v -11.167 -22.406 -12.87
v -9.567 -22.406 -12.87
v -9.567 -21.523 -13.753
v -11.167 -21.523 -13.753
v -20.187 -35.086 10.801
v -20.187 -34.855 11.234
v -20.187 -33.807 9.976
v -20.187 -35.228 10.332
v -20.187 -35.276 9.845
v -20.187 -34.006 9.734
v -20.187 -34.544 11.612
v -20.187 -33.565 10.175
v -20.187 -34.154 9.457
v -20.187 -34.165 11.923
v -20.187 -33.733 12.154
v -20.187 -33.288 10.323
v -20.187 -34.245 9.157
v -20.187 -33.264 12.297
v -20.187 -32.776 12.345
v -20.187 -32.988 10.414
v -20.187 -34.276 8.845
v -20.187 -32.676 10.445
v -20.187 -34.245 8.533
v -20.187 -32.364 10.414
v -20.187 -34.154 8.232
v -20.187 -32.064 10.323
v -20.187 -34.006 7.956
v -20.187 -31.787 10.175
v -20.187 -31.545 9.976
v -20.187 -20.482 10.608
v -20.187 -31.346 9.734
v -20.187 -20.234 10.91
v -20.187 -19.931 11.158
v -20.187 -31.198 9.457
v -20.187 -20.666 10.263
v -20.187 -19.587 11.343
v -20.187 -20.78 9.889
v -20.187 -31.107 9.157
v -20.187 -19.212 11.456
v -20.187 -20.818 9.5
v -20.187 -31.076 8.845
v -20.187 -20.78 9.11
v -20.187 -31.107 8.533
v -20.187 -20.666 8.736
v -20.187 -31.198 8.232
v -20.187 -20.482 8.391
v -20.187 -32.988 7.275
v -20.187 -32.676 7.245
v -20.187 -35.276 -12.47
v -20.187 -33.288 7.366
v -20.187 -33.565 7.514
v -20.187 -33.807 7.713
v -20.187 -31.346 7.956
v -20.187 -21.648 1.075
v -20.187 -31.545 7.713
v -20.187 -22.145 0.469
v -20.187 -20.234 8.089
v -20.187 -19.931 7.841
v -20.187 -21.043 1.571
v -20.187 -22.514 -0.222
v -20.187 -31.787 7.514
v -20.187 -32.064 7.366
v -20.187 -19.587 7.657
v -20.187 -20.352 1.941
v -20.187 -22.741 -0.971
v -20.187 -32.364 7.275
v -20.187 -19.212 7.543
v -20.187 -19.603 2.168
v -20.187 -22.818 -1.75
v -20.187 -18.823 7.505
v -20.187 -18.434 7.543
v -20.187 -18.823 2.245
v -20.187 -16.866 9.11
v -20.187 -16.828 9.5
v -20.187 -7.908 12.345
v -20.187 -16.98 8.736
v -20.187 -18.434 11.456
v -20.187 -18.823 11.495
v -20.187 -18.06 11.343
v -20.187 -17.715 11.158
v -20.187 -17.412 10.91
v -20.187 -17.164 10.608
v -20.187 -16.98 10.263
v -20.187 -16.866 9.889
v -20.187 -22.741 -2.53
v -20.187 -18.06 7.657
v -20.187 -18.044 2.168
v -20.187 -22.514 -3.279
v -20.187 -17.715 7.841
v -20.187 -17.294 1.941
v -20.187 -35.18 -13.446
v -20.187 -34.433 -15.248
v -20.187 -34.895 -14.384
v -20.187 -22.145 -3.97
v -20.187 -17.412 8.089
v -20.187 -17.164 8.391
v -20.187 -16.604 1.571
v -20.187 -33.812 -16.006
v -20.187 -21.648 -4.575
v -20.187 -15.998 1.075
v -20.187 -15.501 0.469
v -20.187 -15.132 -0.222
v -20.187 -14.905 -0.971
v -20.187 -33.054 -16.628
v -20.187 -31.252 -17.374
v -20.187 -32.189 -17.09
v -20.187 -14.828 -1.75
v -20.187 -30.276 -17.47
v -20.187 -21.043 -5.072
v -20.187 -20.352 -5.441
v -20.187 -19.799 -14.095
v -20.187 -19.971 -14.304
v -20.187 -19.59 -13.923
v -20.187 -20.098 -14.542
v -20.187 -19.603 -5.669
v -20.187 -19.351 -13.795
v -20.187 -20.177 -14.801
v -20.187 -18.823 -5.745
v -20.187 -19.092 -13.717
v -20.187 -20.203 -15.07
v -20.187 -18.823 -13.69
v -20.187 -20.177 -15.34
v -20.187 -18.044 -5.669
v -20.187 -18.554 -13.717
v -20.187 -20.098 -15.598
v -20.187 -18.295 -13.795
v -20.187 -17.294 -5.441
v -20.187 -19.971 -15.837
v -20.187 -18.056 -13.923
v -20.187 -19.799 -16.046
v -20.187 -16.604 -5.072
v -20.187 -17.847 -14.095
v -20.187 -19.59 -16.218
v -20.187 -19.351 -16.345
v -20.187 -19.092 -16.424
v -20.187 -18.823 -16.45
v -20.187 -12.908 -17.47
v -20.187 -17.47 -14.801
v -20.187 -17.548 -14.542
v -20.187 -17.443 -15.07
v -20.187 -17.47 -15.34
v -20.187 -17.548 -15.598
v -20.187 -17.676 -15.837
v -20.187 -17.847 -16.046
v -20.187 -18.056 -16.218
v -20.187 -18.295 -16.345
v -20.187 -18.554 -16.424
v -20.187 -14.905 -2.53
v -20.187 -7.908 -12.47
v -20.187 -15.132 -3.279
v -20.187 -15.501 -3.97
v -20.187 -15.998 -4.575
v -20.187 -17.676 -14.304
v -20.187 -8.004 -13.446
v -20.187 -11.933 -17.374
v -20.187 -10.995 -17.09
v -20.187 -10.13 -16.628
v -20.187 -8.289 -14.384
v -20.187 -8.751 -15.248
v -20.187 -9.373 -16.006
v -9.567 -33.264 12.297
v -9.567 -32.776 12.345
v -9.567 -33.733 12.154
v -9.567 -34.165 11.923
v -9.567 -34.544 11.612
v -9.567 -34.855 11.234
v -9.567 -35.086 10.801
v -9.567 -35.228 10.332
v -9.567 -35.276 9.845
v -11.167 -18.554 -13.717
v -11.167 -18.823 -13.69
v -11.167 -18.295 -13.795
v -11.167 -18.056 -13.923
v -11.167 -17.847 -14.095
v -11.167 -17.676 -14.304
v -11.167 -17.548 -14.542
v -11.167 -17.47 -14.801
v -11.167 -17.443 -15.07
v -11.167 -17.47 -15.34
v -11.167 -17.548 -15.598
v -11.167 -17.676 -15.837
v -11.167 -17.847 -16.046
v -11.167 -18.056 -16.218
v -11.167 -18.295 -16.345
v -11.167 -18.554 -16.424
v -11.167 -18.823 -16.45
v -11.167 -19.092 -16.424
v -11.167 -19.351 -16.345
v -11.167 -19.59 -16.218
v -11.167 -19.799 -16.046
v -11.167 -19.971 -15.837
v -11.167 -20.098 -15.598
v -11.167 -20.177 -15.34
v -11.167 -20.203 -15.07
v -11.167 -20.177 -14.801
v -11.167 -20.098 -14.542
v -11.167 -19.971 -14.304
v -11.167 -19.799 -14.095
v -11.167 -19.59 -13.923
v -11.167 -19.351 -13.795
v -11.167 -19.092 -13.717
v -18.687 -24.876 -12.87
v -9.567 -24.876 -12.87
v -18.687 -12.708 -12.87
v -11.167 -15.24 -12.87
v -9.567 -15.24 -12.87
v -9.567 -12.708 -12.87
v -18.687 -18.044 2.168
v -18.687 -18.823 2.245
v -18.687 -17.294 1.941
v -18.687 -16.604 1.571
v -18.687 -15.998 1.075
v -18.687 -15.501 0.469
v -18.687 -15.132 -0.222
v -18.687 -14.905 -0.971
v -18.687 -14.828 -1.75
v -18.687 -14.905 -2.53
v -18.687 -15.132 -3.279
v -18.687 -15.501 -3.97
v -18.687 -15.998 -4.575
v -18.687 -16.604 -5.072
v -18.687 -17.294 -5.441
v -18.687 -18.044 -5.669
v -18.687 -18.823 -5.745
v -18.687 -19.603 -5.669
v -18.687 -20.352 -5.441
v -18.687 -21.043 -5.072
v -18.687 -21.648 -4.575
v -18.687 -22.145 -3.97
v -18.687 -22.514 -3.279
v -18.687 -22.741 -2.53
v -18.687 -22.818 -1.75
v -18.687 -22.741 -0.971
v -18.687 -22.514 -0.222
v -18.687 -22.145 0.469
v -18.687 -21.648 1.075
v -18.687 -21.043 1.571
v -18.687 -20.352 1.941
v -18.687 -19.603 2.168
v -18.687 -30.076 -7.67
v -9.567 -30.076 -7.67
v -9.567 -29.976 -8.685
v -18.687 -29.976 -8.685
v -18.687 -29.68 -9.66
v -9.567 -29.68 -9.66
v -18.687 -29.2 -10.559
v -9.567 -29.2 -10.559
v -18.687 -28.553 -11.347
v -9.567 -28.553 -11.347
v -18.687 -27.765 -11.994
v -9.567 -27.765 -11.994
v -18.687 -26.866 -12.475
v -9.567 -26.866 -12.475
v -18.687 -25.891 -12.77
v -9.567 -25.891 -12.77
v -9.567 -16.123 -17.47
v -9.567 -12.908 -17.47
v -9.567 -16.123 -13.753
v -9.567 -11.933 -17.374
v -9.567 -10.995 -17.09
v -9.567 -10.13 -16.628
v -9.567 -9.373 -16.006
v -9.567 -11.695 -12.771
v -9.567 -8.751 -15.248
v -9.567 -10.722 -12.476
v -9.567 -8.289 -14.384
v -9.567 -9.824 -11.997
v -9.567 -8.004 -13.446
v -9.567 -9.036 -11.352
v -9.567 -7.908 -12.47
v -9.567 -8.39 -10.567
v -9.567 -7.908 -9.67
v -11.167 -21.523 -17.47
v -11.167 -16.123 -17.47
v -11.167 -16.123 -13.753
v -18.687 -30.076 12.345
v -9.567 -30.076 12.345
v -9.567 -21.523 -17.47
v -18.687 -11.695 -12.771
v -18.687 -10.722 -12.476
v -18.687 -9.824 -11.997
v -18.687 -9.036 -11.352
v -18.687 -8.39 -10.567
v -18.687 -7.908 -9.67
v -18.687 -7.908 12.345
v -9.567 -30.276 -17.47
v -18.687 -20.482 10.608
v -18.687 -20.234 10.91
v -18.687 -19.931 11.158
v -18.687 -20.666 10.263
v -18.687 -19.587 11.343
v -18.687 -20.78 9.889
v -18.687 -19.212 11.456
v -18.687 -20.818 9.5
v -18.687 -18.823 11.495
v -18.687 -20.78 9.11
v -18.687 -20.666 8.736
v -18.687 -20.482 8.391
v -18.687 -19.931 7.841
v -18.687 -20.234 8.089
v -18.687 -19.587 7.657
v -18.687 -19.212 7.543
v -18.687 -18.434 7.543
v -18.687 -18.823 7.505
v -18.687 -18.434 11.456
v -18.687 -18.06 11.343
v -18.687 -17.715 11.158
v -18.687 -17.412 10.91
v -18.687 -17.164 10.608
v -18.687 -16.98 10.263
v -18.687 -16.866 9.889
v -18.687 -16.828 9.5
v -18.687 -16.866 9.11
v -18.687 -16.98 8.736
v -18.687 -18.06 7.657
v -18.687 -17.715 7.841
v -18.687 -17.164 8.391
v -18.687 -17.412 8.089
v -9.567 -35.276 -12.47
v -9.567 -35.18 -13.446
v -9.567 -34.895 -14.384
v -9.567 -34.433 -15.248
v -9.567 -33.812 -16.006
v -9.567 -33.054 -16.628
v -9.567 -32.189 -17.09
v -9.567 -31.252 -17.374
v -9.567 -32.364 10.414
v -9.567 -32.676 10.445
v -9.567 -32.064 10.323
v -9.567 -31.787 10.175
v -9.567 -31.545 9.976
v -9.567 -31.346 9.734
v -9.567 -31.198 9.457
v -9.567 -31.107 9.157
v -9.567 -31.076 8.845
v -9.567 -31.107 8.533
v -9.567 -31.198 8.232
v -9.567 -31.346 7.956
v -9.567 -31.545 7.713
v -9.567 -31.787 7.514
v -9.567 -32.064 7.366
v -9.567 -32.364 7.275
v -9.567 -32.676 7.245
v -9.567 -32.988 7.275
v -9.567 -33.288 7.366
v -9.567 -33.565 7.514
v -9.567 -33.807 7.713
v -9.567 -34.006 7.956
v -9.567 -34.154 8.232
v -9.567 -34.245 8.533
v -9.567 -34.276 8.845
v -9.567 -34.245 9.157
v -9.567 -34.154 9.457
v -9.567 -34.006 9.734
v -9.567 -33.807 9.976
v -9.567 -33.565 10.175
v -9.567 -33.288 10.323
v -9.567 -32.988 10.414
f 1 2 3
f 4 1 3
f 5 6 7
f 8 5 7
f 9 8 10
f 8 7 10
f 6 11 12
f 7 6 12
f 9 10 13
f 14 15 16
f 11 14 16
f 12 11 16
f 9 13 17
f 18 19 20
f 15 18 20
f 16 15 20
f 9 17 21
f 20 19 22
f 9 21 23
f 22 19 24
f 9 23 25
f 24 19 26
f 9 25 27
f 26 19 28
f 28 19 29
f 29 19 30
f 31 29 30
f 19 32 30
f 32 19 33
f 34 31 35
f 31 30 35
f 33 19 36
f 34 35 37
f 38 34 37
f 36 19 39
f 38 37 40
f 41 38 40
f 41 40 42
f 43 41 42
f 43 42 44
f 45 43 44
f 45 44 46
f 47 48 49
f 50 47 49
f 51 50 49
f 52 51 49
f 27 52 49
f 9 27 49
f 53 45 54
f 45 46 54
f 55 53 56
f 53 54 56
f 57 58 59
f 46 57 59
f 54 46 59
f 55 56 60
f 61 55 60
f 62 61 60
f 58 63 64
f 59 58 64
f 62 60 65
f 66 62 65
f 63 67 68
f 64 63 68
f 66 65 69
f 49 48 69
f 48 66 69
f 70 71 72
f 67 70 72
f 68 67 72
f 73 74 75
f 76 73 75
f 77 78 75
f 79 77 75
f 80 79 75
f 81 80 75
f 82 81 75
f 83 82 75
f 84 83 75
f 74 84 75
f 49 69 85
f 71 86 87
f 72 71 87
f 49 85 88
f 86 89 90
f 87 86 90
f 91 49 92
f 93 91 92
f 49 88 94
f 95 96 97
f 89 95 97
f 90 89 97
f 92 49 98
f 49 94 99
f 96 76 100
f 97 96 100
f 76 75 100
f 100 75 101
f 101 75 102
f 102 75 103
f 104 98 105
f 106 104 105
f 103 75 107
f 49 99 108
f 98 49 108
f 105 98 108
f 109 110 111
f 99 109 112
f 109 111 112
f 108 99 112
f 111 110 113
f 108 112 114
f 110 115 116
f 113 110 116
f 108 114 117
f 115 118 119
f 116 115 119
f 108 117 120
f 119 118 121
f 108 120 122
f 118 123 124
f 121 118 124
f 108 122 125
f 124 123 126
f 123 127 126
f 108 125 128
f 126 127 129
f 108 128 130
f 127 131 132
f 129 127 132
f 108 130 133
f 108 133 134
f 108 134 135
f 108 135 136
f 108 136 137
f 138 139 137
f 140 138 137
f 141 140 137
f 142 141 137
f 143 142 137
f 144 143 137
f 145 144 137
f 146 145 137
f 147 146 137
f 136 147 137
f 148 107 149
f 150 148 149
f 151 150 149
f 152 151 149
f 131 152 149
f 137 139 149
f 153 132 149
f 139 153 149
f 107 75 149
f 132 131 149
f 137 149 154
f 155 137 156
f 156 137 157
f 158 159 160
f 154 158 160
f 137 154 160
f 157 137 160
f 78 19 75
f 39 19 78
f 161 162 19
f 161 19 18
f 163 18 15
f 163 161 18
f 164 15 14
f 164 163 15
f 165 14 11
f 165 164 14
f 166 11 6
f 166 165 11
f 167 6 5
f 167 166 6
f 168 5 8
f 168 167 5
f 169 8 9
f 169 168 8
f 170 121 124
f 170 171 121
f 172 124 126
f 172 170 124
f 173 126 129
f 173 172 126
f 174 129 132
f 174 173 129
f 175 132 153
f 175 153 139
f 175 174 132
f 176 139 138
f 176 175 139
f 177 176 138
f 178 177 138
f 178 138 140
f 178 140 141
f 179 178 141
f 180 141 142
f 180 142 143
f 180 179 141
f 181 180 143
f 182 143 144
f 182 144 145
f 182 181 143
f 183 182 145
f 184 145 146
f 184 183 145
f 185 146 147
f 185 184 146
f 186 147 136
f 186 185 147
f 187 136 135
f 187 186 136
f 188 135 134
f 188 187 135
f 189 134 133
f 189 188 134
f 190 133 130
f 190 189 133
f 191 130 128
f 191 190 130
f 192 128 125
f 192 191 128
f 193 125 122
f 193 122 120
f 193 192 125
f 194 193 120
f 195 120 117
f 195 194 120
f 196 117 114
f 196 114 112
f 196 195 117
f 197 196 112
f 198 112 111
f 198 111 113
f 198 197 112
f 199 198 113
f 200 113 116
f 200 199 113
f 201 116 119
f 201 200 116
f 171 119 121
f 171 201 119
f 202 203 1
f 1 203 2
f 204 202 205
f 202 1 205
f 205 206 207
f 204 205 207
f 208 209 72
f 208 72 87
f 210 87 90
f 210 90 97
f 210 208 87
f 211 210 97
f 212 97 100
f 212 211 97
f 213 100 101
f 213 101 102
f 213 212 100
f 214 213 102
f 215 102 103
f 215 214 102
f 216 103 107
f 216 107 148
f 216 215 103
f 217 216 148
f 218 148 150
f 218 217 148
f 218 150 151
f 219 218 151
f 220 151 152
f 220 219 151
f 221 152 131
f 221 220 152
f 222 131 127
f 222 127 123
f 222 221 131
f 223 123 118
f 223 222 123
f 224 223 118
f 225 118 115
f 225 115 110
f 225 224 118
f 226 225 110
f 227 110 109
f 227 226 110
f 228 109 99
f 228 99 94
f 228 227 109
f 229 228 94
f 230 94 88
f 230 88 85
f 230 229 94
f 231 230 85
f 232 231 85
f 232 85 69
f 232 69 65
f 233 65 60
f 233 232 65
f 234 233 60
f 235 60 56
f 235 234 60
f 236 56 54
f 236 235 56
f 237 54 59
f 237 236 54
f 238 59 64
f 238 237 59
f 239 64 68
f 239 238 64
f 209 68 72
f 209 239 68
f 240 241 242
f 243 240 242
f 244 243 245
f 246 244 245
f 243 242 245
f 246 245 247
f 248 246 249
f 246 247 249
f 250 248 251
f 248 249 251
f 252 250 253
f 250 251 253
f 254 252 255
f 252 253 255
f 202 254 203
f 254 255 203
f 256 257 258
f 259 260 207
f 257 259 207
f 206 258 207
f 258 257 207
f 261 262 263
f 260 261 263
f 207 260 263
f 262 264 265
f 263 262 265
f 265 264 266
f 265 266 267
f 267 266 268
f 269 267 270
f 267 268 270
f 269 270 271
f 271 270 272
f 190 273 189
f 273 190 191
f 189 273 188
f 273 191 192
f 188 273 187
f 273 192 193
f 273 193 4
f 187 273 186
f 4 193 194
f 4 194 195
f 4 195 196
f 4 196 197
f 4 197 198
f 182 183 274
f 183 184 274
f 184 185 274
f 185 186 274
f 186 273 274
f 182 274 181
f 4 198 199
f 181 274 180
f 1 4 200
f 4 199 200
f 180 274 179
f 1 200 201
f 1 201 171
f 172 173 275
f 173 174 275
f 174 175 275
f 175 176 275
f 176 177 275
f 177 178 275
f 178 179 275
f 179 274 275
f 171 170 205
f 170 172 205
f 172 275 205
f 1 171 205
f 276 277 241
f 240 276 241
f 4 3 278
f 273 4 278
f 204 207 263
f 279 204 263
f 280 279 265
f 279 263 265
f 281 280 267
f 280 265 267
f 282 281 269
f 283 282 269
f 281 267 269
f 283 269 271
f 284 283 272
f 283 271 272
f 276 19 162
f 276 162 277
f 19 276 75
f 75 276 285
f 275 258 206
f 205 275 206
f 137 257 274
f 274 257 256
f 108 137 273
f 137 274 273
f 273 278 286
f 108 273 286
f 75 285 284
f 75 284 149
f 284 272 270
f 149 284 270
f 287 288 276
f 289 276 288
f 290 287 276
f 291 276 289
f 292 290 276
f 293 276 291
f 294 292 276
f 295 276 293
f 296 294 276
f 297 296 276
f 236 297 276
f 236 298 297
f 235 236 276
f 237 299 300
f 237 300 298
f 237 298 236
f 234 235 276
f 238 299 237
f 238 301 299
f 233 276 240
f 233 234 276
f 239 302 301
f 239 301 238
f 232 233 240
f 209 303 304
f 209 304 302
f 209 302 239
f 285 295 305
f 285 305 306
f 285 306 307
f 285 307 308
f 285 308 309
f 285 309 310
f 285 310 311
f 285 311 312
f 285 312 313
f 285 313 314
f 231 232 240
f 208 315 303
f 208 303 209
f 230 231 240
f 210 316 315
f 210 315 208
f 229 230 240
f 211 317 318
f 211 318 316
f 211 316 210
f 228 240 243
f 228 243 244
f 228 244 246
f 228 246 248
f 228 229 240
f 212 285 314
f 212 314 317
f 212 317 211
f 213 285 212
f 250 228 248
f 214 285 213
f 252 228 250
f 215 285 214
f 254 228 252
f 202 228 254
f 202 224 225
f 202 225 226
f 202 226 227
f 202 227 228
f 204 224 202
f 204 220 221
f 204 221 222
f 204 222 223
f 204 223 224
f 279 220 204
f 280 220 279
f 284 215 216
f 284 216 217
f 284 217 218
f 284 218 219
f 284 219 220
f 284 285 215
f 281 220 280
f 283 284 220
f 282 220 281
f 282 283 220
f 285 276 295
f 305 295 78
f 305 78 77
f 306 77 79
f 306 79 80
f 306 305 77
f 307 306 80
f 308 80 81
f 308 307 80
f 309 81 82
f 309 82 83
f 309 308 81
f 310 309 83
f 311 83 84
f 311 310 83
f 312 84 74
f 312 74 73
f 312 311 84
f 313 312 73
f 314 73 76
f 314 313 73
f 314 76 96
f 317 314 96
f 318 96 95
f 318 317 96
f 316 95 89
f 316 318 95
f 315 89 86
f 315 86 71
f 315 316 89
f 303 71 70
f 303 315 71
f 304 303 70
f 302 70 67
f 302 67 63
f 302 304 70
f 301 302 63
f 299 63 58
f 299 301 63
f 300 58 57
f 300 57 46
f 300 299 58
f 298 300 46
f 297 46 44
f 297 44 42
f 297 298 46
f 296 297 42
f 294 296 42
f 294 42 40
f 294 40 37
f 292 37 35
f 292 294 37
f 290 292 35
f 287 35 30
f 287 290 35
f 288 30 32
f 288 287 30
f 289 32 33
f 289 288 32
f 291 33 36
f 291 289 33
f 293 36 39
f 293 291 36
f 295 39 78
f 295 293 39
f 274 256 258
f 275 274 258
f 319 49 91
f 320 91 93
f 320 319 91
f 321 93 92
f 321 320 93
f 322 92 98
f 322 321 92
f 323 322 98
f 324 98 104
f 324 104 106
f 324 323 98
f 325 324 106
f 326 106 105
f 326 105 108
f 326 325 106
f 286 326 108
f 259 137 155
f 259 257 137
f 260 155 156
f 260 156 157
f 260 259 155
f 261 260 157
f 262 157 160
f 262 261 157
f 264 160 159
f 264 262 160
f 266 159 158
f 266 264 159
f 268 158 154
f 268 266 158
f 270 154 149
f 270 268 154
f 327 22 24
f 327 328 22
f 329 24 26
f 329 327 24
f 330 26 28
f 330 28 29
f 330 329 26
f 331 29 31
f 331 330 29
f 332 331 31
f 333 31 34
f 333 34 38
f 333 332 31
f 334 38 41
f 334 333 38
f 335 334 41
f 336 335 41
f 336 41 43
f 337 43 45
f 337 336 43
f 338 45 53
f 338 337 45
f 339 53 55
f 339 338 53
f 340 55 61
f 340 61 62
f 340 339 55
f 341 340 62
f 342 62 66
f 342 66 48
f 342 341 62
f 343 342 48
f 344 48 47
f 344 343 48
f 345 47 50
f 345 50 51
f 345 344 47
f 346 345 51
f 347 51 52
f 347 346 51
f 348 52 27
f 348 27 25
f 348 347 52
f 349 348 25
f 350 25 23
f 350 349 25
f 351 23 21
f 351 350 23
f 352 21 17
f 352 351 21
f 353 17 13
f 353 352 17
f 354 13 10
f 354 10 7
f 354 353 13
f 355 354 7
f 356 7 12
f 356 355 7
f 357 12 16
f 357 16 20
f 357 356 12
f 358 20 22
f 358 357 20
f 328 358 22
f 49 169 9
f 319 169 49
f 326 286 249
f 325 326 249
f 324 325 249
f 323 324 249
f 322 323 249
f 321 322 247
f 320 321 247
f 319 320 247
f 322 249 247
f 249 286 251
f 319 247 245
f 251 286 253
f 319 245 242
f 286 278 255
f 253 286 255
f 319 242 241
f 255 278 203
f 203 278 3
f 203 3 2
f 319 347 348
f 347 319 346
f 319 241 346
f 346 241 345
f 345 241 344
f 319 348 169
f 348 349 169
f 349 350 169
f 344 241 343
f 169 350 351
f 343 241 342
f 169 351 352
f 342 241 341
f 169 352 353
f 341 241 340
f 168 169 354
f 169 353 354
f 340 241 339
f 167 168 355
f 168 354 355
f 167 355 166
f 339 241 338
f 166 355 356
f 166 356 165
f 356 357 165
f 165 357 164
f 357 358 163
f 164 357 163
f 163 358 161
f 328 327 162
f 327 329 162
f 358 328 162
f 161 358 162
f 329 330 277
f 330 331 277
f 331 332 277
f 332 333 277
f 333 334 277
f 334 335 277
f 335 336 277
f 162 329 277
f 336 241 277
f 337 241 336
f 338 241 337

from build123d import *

# Parameters (mm, degrees)
BOSS_EXTRUDE1_START = -7.320002
SKETCH1_R           = 1.38
SKETCH1_R_2         = 1.6
BOSS_EXTRUDE1_DEPTH = 7.520002
BOSS_EXTRUDE2_START = -8.920002
SKETCH1_3_R         = 1.6
BOSS_EXTRUDE2_DEPTH = 1.6
BOSS_EXTRUDE3_START = 0.2
SKETCH1_4_R         = 1.6
SKETCH1_4_R_2       = 1.38
SKETCH1_4_R_3       = 3.995
SKETCH1_4_R_4       = 1.995
BOSS_EXTRUDE3_DEPTH = 1.5


with BuildPart() as part:
    # Sketch1 → Boss-Extrude1 (new body)
    with BuildSketch(Plane.ZY.offset(18.486711134).offset(BOSS_EXTRUDE1_START)):
        with BuildLine():
            ThreePointArc((-12.870344381, -12.708128144), (-11.997005912, -9.823687124), (-9.670344381, -7.908128144))
            Line((-9.670344381, -7.908128144), (-12.470344381, -7.908128144))
            ThreePointArc((-12.470344381, -7.908128144), (-16.005878287, -9.372594238), (-17.470344381, -12.908128144))
            Line((-17.470344381, -12.908128144), (-17.470344381, -30.276049303))
            ThreePointArc((-17.470344381, -30.276049303), (-16.005878287, -33.811583208), (-12.470344381, -35.276049303))
            Line((-12.470344381, -35.276049303), (9.844655619, -35.276049303))
            ThreePointArc((9.844655619, -35.276049303), (11.612422572, -34.543816256), (12.344655619, -32.776049303))
            Line((12.344655619, -32.776049303), (12.344655619, -30.076049303))
            Line((12.344655619, -30.076049303), (-7.670344381, -30.076049303))
            ThreePointArc((-7.670344381, -30.076049303), (-11.347299643, -28.553004565), (-12.870344381, -24.876049303))
            Line((-12.870344381, -24.876049303), (-12.870344381, -12.708128144))
        make_face()
        with Locations((-15.070344381, -18.823128144)):
            Circle(SKETCH1_R, mode=Mode.SUBTRACT)
        with Locations((8.844655619, -32.676049303)):
            Circle(SKETCH1_R_2, mode=Mode.SUBTRACT)
    extrude(amount=BOSS_EXTRUDE1_DEPTH)

    # Sketch1<3> → Boss-Extrude2 (add)
    with BuildSketch(Plane.ZY.offset(18.486711134).offset(BOSS_EXTRUDE2_START)):
        with BuildLine():
            ThreePointArc((-12.870344381, -12.708128144), (-11.997005912, -9.823687124), (-9.670344381, -7.908128144))
            Line((-9.670344381, -7.908128144), (-12.470344381, -7.908128144))
            ThreePointArc((-12.470344381, -7.908128144), (-16.005878287, -9.372594238), (-17.470344381, -12.908128144))
            Line((-17.470344381, -12.908128144), (-17.470344381, -16.123128144))
            Line((-17.470344381, -16.123128144), (-13.753187094, -16.123128144))
            Line((-13.753187094, -16.123128144), (-12.870344381, -15.240285432))
            Line((-12.870344381, -15.240285432), (-12.870344381, -12.708128144))
        make_face()
        with BuildLine():
            Line((12.344655619, -32.776049303), (12.344655619, -30.076049303))
            Line((12.344655619, -30.076049303), (-7.670344381, -30.076049303))
            ThreePointArc((-7.670344381, -30.076049303), (-11.347299643, -28.553004565), (-12.870344381, -24.876049303))
            Line((-12.870344381, -24.876049303), (-12.870344381, -22.405970857))
            Line((-12.870344381, -22.405970857), (-13.753187094, -21.523128144))
            Line((-13.753187094, -21.523128144), (-17.470344381, -21.523128144))
            Line((-17.470344381, -21.523128144), (-17.470344381, -30.276049303))
            ThreePointArc((-17.470344381, -30.276049303), (-16.005878287, -33.811583208), (-12.470344381, -35.276049303))
            Line((-12.470344381, -35.276049303), (9.844655619, -35.276049303))
            ThreePointArc((9.844655619, -35.276049303), (11.612422572, -34.543816256), (12.344655619, -32.776049303))
        make_face()
        with Locations((8.844655619, -32.676049303)):
            Circle(SKETCH1_3_R, mode=Mode.SUBTRACT)
    extrude(amount=BOSS_EXTRUDE2_DEPTH)

    # Sketch1<4> → Boss-Extrude3 (add)
    with BuildSketch(Plane.ZY.offset(18.486711134).offset(BOSS_EXTRUDE3_START)):
        with BuildLine():
            ThreePointArc((-12.870344381, -24.876049303), (-11.347299643, -28.553004565), (-7.670344381, -30.076049303))
            Line((-7.670344381, -30.076049303), (12.344655619, -30.076049303))
            Line((12.344655619, -30.076049303), (12.344655619, -32.776049303))
            ThreePointArc((12.344655619, -32.776049303), (11.612422572, -34.543816256), (9.844655619, -35.276049303))
            Line((9.844655619, -35.276049303), (-12.470344381, -35.276049303))
            ThreePointArc((-12.470344381, -35.276049303), (-16.005878287, -33.811583208), (-17.470344381, -30.276049303))
            Line((-17.470344381, -30.276049303), (-17.470344381, -21.523128144))
            Line((-17.470344381, -21.523128144), (-13.753187094, -21.523128144))
            Line((-13.753187094, -21.523128144), (-12.870344381, -22.405970857))
            Line((-12.870344381, -22.405970857), (-12.870344381, -24.876049303))
        make_face()
        with Locations((8.844655619, -32.676049303)):
            Circle(SKETCH1_4_R, mode=Mode.SUBTRACT)
        with BuildLine():
            ThreePointArc((-9.670344381, -7.908128144), (-11.997005912, -9.823687124), (-12.870344381, -12.708128144))
            Line((-12.870344381, -12.708128144), (-12.870344381, -15.240285432))
            Line((-12.870344381, -15.240285432), (-13.753187094, -16.123128144))
            Line((-13.753187094, -16.123128144), (-17.470344381, -16.123128144))
            Line((-17.470344381, -16.123128144), (-17.470344381, -12.908128144))
            ThreePointArc((-17.470344381, -12.908128144), (-16.005878287, -9.372594238), (-12.470344381, -7.908128144))
            Line((-12.470344381, -7.908128144), (-9.670344381, -7.908128144))
        make_face()
        Polygon((-12.870344381, -22.405970857), (-12.870344381, -15.240285432), (-13.753187094, -16.123128144), (-17.470344381, -16.123128144), (-17.470344381, -21.523128144), (-13.753187094, -21.523128144), align=None)
        with Locations((-15.070344381, -18.823128144)):
            Circle(SKETCH1_4_R_2, mode=Mode.SUBTRACT)
        with BuildLine():
            Line((12.344655619, -29.376049303), (12.344655619, -8.208128144))
            Line((12.344655619, -8.208128144), (-7.670344381, -8.208128144))
            ThreePointArc((-7.670344381, -8.208128144), (-10.852324897, -9.526147629), (-12.170344381, -12.708128144))
            Line((-12.170344381, -12.708128144), (-12.170344381, -24.876049303))
            ThreePointArc((-12.170344381, -24.876049303), (-10.852324897, -28.058029818), (-7.670344381, -29.376049303))
            Line((-7.670344381, -29.376049303), (12.344655619, -29.376049303))
        make_face()
        with Locations((-1.750344381, -18.823128144)):
            Circle(SKETCH1_4_R_3, mode=Mode.SUBTRACT)
        with Locations((9.499655619, -18.823128144)):
            Circle(SKETCH1_4_R_4, mode=Mode.SUBTRACT)
        with BuildLine():
            Line((12.344655619, -7.908128144), (-9.670344381, -7.908128144))
            ThreePointArc((-9.670344381, -7.908128144), (-11.997005912, -9.823687124), (-12.870344381, -12.708128144))
            Line((-12.870344381, -12.708128144), (-12.870344381, -15.240285432))
            Line((-12.870344381, -15.240285432), (-12.870344381, -22.405970857))
            Line((-12.870344381, -22.405970857), (-12.870344381, -24.876049303))
            ThreePointArc((-12.870344381, -24.876049303), (-11.347299643, -28.553004565), (-7.670344381, -30.076049303))
            Line((-7.670344381, -30.076049303), (12.344655619, -30.076049303))
            Line((12.344655619, -30.076049303), (12.344655619, -29.376049303))
            Line((12.344655619, -29.376049303), (-7.670344381, -29.376049303))
            ThreePointArc((-7.670344381, -29.376049303), (-10.852324897, -28.058029818), (-12.170344381, -24.876049303))
            Line((-12.170344381, -24.876049303), (-12.170344381, -12.708128144))
            ThreePointArc((-12.170344381, -12.708128144), (-10.852324897, -9.526147629), (-7.670344381, -8.208128144))
            Line((-7.670344381, -8.208128144), (12.344655619, -8.208128144))
            Line((12.344655619, -8.208128144), (12.344655619, -7.908128144))
        make_face()
    extrude(amount=BOSS_EXTRUDE3_DEPTH)


solid = part.part
